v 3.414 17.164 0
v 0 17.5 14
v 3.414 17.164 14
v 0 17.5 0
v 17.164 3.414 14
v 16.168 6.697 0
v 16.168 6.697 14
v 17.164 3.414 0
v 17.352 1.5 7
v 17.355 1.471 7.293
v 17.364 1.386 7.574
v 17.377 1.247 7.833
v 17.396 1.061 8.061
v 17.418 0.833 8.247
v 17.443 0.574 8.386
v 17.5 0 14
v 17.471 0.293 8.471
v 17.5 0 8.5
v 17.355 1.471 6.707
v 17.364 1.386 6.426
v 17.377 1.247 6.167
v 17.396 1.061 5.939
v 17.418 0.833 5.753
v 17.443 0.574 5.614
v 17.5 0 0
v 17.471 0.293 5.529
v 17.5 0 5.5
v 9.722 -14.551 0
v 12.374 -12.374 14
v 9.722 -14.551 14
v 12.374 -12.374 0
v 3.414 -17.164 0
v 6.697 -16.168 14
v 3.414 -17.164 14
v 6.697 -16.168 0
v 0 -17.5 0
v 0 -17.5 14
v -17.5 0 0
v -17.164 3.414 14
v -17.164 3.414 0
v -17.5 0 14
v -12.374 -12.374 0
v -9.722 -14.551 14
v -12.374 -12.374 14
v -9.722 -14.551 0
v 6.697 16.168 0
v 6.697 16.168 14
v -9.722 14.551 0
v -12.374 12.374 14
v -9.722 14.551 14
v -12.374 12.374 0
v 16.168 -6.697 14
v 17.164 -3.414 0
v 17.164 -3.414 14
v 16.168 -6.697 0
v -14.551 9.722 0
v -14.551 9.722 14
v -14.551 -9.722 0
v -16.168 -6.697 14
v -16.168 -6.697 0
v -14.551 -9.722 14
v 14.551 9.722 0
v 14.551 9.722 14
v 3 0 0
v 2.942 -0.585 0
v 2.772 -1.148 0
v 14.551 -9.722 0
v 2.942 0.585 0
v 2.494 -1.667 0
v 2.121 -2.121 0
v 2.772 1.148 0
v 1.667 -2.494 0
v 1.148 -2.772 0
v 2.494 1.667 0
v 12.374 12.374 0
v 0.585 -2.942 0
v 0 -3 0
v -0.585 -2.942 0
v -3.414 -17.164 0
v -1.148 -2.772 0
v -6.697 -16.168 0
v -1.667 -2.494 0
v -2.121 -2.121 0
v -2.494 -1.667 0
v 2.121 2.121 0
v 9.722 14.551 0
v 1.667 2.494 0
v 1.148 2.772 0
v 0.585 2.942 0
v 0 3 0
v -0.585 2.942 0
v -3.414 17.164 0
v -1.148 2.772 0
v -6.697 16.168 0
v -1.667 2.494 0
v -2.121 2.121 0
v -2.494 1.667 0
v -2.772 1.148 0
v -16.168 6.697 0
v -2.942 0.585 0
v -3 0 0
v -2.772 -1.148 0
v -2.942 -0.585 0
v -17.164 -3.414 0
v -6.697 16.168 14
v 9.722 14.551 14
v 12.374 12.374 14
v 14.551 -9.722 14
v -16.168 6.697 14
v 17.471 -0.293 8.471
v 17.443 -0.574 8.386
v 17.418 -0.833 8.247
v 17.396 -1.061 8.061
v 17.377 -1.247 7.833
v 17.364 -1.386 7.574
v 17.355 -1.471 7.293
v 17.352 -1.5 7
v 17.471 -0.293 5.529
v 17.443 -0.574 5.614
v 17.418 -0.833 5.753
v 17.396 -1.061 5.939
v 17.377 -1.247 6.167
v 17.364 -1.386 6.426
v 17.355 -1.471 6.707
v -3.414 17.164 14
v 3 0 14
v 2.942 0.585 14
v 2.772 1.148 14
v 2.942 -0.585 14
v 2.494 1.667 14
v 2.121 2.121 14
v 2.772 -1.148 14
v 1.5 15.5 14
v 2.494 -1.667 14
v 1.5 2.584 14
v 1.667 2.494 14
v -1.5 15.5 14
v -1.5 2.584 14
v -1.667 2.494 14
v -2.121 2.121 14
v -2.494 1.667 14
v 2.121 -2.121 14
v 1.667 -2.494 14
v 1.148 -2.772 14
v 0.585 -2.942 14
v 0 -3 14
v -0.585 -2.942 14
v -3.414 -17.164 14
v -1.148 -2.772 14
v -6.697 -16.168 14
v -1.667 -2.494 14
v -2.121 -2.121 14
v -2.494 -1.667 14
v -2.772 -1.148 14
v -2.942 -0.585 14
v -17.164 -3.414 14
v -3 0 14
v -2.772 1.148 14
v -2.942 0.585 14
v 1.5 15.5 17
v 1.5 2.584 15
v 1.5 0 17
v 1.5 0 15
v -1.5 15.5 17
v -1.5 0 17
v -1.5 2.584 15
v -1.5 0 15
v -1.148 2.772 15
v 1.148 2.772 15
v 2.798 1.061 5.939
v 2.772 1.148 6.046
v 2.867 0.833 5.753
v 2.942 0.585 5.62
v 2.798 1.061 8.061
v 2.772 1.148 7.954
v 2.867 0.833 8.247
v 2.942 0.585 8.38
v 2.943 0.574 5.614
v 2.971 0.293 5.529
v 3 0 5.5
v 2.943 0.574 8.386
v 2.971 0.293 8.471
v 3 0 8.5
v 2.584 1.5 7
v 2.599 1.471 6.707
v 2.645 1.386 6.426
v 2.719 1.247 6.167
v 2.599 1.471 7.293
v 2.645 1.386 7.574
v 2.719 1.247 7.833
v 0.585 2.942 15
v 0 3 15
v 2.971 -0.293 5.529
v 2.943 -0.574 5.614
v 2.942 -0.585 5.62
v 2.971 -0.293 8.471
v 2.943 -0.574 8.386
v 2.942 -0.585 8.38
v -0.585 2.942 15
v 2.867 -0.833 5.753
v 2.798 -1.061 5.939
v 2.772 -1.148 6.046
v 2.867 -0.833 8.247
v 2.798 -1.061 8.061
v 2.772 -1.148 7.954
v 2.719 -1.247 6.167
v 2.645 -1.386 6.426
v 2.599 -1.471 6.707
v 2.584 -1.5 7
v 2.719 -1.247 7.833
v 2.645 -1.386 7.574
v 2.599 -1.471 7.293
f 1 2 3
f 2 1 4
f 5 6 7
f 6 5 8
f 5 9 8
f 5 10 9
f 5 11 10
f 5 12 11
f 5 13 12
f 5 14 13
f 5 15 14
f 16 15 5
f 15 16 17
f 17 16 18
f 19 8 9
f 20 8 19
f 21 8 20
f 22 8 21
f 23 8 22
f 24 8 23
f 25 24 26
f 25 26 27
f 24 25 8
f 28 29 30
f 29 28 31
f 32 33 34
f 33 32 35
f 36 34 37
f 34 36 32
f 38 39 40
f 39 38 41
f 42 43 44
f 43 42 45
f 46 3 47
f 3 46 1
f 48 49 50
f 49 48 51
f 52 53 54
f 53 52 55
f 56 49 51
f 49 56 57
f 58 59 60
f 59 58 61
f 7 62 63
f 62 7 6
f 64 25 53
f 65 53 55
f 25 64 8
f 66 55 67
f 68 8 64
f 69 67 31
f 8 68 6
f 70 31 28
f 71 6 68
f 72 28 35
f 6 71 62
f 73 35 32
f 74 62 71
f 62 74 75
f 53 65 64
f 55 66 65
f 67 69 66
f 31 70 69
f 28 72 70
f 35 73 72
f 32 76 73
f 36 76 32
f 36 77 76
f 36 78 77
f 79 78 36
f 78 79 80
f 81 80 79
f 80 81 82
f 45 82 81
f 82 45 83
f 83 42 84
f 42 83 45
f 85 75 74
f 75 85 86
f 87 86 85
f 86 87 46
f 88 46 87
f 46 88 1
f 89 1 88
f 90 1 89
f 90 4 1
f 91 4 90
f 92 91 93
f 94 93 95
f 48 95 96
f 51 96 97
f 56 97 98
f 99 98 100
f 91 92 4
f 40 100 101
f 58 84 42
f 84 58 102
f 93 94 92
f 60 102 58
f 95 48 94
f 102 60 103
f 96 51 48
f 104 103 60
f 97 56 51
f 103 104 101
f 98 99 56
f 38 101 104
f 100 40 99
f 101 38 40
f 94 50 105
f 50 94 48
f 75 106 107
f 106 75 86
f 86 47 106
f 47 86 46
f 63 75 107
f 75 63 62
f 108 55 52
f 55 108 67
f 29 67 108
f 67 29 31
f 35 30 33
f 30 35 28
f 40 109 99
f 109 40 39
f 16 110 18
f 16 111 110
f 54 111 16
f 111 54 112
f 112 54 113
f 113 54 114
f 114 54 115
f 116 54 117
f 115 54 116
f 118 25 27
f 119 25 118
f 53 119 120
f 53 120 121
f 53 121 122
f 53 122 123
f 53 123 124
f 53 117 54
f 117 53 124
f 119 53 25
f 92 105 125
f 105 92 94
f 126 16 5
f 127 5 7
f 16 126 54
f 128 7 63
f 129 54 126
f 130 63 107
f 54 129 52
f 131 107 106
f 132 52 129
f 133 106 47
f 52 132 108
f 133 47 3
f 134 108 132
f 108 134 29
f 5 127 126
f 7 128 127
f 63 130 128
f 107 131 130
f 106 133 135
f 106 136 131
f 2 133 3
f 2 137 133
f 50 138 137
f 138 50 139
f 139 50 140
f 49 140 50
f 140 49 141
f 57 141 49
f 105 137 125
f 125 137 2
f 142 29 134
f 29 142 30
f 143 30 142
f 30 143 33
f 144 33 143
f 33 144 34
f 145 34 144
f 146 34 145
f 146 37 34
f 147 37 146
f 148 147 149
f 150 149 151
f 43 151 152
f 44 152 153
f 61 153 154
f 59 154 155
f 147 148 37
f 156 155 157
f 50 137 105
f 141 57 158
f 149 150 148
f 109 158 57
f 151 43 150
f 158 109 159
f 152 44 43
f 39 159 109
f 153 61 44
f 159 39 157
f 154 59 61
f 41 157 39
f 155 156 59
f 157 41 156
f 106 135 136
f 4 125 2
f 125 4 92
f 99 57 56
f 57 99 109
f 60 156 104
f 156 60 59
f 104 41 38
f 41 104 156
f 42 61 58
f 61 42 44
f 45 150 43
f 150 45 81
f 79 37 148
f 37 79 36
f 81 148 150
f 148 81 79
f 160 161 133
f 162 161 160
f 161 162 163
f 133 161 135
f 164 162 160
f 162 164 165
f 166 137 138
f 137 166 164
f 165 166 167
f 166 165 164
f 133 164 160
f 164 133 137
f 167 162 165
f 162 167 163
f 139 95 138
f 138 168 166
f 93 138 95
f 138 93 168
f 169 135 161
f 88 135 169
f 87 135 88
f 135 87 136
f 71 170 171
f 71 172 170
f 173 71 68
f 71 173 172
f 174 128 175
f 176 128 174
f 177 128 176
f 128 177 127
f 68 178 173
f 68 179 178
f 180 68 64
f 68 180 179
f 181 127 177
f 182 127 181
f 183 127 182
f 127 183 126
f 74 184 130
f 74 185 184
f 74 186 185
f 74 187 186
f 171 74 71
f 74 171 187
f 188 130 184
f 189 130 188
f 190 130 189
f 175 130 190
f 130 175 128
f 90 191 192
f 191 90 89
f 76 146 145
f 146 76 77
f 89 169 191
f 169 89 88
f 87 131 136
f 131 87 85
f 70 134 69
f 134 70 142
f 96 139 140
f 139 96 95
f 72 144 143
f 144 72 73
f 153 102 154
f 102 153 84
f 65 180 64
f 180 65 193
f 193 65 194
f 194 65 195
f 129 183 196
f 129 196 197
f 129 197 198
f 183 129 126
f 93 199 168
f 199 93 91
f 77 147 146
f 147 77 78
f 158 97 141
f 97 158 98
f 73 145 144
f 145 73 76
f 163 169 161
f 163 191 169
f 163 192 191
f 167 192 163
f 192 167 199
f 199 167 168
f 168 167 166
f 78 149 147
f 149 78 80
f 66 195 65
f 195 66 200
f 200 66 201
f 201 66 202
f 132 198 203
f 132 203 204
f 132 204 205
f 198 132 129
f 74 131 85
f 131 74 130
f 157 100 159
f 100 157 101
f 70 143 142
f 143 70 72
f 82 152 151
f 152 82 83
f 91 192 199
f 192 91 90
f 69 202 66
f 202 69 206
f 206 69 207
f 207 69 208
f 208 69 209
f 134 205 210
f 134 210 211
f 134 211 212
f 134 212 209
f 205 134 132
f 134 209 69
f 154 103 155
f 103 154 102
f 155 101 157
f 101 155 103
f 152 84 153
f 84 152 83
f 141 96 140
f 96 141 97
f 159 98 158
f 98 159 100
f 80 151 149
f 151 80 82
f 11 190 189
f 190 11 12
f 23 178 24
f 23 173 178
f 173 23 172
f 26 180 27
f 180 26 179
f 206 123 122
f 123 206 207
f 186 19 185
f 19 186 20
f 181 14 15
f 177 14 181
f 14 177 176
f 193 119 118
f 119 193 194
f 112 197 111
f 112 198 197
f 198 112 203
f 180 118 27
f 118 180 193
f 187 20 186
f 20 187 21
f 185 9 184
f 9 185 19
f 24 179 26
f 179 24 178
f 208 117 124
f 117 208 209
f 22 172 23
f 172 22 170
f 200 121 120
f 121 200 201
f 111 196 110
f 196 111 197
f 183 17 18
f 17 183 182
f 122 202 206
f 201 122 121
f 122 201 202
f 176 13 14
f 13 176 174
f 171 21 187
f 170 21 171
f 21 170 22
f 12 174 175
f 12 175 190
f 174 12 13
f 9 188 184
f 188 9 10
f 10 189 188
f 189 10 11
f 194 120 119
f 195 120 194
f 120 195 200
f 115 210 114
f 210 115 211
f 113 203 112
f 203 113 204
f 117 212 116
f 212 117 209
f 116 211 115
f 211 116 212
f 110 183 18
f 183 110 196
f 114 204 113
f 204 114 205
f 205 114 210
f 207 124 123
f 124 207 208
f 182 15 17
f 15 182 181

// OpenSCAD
$fn = 32;

// ----------------------------------------------------------------------
// Control knob: pointer knob
// ----------------------------------------------------------------------

// --- parameters (mm) ---
rib_w = 3;                // pointer rib width
rib_h = 4;                // pointer rib height
knob_d = 35;              // knob body diameter
knob_h = 14;              // knob body height
bore_d = 6;               // shaft bore diameter
set_d = 3;                // set screw bore diameter
fit_tol = 0.1;            // tolerance for press fits, mm
free_tol = 0.3;           // tolerance for clearance fits, mm

rib_poke = rib_h - 1;  // rib height above the top
total_h = knob_h + rib_h - 1;  // overall height

difference() {
  union() {
    cylinder(h = knob_h, d = knob_d);
    translate([-rib_w / 2, 0, knob_h - 1])
      cube([rib_w, knob_d / 2 - 2, rib_h]);
  }
  translate([0, 0, -1]) cylinder(h = knob_h + 2, d = bore_d);
  translate([-1, 0, knob_h / 2]) rotate([0, 90, 0])
    cylinder(h = knob_d / 2 + bore_d / 2 + 2, d = set_d);}
